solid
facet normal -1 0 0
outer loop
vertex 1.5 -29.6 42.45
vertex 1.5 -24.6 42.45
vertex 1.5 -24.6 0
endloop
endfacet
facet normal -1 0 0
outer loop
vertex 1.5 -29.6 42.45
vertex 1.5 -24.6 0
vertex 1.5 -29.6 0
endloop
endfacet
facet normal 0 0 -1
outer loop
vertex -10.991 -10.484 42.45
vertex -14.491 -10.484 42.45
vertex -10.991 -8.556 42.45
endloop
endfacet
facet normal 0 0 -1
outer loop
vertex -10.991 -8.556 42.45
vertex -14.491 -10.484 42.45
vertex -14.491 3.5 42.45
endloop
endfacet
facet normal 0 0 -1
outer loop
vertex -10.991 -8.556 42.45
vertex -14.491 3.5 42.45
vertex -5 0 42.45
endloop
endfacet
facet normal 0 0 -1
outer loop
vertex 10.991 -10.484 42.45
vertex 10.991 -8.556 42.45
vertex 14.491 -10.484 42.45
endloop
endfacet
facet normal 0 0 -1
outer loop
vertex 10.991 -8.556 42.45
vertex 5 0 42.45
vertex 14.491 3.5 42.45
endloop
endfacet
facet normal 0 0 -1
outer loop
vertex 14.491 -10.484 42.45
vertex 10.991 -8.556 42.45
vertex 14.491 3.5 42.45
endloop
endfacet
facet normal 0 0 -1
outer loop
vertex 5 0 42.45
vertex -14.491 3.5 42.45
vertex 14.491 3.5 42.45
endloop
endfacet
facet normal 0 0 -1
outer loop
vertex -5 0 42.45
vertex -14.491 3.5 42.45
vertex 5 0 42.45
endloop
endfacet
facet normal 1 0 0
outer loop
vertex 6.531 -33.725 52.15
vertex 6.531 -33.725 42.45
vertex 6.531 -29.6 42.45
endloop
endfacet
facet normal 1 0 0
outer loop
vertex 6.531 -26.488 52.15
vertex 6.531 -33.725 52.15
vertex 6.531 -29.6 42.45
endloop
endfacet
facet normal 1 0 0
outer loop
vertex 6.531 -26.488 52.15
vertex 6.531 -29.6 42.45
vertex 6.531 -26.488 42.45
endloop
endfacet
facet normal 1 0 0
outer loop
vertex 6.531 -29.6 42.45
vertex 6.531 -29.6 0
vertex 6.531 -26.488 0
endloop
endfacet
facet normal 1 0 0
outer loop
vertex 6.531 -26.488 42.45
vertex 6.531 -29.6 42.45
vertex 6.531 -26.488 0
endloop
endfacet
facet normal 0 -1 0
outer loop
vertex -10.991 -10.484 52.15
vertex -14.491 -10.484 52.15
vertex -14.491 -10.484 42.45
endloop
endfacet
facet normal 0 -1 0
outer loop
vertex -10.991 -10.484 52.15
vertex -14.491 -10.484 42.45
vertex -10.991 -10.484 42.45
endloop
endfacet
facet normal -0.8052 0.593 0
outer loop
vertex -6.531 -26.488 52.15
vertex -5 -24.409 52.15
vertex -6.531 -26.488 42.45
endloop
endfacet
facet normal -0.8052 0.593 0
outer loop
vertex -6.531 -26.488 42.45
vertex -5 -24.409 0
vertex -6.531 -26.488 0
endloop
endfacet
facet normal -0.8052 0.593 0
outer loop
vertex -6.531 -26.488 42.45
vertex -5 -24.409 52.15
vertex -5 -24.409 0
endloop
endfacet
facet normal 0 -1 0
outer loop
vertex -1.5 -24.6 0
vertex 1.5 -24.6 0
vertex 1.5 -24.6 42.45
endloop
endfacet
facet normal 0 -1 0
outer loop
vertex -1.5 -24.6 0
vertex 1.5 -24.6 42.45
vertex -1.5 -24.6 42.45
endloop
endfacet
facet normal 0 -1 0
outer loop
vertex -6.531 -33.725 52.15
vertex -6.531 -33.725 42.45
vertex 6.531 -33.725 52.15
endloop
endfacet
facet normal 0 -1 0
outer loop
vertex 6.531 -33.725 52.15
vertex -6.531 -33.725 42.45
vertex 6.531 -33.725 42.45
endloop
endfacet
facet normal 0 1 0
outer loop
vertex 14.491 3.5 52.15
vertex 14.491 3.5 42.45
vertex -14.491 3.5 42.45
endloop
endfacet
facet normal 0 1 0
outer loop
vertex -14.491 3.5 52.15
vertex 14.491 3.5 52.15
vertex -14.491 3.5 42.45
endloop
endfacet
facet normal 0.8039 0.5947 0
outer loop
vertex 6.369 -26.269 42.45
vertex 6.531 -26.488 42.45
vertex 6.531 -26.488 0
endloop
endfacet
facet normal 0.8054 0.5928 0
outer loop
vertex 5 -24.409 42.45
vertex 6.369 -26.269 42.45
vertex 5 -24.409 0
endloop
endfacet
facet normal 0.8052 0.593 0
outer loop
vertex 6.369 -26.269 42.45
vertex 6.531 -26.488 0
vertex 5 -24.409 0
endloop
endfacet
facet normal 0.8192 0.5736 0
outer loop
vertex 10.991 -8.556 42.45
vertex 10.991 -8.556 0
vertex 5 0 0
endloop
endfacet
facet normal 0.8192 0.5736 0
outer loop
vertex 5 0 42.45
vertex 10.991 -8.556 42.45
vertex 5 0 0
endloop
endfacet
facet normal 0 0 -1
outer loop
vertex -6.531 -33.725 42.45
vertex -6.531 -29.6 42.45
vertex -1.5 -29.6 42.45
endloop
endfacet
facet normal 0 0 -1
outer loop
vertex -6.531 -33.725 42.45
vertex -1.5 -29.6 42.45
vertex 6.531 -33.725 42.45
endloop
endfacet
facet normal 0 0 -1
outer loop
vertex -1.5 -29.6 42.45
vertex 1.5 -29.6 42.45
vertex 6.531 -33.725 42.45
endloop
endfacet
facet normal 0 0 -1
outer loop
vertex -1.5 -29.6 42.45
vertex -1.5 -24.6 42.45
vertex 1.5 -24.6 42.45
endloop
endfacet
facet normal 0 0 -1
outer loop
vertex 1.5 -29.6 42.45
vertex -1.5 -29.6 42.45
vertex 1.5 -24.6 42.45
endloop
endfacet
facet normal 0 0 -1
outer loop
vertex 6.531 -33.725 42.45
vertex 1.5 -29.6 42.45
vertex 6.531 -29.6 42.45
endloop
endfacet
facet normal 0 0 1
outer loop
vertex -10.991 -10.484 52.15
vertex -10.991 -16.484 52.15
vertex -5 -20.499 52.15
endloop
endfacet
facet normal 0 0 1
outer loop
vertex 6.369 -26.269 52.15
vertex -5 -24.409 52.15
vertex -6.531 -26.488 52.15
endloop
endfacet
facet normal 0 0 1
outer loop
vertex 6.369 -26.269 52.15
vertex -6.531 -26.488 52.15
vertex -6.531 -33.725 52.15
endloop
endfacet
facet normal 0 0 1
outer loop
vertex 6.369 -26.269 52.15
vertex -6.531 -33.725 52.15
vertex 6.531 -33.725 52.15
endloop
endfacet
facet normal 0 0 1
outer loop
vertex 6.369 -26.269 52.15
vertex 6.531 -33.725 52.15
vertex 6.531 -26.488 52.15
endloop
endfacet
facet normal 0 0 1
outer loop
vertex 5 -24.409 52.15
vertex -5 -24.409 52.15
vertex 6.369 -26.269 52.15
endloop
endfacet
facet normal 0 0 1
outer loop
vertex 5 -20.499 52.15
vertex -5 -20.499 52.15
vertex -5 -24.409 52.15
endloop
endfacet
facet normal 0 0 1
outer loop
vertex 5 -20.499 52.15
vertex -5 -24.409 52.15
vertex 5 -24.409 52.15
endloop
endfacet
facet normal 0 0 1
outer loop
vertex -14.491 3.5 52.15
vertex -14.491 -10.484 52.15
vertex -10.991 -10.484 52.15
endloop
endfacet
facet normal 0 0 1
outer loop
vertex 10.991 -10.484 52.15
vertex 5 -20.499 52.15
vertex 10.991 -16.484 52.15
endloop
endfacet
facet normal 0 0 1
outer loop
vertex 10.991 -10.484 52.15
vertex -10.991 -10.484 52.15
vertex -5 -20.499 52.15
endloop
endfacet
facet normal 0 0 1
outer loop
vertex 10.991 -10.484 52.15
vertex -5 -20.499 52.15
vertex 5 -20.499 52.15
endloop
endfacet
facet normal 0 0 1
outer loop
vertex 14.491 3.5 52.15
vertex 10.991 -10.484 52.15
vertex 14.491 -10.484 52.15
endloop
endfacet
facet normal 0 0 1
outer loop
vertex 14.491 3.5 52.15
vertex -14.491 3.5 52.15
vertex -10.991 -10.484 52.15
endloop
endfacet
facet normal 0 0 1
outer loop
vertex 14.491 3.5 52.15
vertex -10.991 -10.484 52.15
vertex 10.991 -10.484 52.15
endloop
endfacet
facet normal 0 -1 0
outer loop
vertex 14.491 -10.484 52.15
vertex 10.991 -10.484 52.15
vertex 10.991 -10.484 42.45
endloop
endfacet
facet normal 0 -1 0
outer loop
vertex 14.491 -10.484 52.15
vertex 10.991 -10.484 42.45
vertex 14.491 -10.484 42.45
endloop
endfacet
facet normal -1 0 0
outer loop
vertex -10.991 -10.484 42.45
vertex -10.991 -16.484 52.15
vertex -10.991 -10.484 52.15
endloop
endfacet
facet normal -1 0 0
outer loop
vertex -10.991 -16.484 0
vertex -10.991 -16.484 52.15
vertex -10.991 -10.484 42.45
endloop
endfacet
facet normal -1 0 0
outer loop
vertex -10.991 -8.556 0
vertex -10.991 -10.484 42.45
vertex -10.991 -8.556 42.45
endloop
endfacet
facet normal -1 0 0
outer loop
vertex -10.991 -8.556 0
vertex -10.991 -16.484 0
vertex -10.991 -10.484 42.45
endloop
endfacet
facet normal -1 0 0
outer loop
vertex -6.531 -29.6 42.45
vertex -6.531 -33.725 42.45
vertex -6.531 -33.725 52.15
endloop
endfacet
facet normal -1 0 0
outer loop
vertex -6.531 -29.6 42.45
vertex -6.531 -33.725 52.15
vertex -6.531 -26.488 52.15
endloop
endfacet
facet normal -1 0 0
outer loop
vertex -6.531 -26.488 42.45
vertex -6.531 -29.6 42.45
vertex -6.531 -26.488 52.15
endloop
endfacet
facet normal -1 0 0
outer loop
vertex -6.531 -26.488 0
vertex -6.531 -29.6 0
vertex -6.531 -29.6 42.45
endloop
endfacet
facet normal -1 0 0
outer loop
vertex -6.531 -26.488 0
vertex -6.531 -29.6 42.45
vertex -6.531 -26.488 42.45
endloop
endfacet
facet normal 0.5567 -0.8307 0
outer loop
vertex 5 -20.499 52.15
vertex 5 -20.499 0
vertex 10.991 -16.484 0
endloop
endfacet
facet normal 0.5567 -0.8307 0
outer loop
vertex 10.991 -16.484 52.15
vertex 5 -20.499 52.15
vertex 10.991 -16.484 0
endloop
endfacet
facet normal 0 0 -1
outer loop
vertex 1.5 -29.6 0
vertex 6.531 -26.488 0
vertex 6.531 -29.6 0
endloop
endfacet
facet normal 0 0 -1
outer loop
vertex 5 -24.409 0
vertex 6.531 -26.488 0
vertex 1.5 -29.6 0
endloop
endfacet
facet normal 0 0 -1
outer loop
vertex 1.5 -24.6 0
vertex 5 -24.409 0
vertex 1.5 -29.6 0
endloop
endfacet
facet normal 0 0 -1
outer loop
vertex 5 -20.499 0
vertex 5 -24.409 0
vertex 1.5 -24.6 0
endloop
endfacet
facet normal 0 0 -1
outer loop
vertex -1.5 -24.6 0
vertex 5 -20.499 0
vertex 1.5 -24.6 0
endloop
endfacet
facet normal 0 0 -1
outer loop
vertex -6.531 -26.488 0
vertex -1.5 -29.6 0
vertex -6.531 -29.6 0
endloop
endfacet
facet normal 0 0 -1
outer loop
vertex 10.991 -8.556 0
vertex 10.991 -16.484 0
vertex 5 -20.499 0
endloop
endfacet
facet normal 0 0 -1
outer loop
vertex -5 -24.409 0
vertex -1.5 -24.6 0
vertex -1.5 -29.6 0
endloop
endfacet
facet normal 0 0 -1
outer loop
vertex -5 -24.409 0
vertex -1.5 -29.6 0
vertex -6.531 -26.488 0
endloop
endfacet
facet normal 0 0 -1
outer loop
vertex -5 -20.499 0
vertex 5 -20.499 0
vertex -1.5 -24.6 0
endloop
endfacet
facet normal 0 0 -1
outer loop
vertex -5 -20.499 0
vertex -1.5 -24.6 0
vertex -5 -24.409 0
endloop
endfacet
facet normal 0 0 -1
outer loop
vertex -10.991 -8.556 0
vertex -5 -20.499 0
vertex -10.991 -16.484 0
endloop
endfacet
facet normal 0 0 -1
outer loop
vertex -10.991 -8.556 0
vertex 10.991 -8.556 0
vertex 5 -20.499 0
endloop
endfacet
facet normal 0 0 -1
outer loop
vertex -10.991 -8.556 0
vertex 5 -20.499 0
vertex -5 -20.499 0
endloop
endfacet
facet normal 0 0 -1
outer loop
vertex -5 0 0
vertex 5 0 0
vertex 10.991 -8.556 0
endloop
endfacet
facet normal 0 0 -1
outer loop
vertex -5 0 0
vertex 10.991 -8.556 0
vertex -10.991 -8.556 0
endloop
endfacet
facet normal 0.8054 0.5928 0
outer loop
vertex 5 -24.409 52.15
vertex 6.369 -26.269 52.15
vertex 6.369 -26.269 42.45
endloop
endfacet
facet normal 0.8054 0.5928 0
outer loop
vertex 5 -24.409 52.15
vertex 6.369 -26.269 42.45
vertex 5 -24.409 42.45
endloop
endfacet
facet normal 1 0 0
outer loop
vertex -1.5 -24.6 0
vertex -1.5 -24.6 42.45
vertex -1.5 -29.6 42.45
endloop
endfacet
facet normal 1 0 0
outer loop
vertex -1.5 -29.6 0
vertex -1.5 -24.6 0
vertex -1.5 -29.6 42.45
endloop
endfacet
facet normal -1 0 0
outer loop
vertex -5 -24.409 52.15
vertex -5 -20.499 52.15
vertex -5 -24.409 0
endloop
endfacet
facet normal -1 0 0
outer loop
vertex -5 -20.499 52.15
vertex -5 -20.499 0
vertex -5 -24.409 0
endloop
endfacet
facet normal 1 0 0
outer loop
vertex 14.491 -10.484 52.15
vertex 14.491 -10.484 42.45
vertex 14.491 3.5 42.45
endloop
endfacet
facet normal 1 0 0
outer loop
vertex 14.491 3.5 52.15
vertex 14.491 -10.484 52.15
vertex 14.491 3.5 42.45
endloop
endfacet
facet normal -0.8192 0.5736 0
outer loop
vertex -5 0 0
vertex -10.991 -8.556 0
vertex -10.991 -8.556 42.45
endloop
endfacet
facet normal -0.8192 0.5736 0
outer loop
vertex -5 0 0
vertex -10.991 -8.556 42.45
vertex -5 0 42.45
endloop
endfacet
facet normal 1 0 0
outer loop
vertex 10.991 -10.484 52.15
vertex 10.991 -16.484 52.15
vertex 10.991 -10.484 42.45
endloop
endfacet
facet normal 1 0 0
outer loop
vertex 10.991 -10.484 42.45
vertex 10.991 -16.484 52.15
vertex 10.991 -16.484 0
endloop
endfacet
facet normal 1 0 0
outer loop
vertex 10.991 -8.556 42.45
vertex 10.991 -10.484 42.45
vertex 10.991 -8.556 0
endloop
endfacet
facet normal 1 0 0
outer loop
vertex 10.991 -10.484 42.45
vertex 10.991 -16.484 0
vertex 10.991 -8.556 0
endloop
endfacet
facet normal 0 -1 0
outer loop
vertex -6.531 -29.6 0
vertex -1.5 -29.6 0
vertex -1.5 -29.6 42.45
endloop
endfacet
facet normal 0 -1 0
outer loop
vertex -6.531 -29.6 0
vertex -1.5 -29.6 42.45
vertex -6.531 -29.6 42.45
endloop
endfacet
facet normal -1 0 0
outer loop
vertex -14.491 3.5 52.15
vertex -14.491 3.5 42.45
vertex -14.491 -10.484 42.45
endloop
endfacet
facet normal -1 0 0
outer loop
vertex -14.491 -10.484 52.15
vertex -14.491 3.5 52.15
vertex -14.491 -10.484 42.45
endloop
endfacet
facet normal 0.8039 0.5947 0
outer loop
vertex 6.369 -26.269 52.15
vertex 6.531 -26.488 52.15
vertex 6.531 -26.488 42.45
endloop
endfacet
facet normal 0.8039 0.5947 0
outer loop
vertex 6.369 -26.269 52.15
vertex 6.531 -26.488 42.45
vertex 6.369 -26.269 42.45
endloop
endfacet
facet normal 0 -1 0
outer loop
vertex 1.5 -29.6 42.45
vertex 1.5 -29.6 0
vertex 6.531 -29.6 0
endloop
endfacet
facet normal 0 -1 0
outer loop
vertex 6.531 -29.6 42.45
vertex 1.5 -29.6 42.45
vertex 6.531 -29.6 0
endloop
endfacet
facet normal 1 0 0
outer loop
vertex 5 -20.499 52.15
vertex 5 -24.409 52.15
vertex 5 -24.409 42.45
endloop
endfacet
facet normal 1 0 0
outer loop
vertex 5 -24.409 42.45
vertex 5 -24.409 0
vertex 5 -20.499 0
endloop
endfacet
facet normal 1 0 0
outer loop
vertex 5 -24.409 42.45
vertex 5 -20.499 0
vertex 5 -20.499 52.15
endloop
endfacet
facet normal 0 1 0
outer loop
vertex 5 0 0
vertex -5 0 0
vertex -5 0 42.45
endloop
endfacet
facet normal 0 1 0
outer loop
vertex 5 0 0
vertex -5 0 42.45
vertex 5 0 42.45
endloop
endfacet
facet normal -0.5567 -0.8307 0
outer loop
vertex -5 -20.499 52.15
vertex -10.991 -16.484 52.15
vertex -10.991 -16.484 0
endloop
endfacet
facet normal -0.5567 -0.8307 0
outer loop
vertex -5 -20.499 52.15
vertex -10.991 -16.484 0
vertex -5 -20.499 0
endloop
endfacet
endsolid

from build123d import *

# Parameters (mm, degrees)
F1_DEPTH = 42.45
F3_W     = 13.0613458827
F3_H     = 7.237181995
F4_DEPTH = 9.7


with BuildPart() as f1:
    # F0 (on Top) → F1 (new body)
    with BuildSketch(Plane.XY):
        Polygon((5, 0), (0, 0), (0, -24.6), (1.5, -24.6), (1.5, -29.6), (6.5306729414, -29.6), (6.5306729414, -26.4880058984), (5, -24.4090993645), (5, -20.4990993645), (10.9908135316, -16.48406431), (10.9908135316, -8.5557684039), align=None)
    extrude(amount=F1_DEPTH)

    # F2: F1 across face


with BuildPart() as f1_1:
    add(f1.part)
    add(f1.part.mirror(Plane(origin=(0, -12.3, 21.225), x_dir=(0, -1, 0), z_dir=(-1, 0, 0))))

    # F3 (on face) → F4 (join)
    with BuildSketch(Plane.XY.offset(42.45)):
        Polygon((10.9908135316, -10.48406431), (14.4908135316, -10.48406431), (14.4908135316, 3.5), (-14.4908135316, 3.5), (-14.4908135316, -10.48406431), (-10.9908135316, -10.48406431), (-10.9908135316, -16.48406431), (10.9908135316, -16.48406431), align=None)
        Polygon((5, -20.4990993645), (10.9908135316, -16.48406431), (-10.9908135316, -16.48406431), (-5, -20.4990993645), (-5, -24.4090993645), (-6.5306729414, -26.4880058984), (6.5306729414, -26.4880058984), (6.3694567187, -26.2690476549), (5, -24.4090993645), align=None)
        with Locations((0, -30.106596896)):
            Rectangle(F3_W, F3_H)
    extrude(amount=F4_DEPTH)


solid = f1_1.part
